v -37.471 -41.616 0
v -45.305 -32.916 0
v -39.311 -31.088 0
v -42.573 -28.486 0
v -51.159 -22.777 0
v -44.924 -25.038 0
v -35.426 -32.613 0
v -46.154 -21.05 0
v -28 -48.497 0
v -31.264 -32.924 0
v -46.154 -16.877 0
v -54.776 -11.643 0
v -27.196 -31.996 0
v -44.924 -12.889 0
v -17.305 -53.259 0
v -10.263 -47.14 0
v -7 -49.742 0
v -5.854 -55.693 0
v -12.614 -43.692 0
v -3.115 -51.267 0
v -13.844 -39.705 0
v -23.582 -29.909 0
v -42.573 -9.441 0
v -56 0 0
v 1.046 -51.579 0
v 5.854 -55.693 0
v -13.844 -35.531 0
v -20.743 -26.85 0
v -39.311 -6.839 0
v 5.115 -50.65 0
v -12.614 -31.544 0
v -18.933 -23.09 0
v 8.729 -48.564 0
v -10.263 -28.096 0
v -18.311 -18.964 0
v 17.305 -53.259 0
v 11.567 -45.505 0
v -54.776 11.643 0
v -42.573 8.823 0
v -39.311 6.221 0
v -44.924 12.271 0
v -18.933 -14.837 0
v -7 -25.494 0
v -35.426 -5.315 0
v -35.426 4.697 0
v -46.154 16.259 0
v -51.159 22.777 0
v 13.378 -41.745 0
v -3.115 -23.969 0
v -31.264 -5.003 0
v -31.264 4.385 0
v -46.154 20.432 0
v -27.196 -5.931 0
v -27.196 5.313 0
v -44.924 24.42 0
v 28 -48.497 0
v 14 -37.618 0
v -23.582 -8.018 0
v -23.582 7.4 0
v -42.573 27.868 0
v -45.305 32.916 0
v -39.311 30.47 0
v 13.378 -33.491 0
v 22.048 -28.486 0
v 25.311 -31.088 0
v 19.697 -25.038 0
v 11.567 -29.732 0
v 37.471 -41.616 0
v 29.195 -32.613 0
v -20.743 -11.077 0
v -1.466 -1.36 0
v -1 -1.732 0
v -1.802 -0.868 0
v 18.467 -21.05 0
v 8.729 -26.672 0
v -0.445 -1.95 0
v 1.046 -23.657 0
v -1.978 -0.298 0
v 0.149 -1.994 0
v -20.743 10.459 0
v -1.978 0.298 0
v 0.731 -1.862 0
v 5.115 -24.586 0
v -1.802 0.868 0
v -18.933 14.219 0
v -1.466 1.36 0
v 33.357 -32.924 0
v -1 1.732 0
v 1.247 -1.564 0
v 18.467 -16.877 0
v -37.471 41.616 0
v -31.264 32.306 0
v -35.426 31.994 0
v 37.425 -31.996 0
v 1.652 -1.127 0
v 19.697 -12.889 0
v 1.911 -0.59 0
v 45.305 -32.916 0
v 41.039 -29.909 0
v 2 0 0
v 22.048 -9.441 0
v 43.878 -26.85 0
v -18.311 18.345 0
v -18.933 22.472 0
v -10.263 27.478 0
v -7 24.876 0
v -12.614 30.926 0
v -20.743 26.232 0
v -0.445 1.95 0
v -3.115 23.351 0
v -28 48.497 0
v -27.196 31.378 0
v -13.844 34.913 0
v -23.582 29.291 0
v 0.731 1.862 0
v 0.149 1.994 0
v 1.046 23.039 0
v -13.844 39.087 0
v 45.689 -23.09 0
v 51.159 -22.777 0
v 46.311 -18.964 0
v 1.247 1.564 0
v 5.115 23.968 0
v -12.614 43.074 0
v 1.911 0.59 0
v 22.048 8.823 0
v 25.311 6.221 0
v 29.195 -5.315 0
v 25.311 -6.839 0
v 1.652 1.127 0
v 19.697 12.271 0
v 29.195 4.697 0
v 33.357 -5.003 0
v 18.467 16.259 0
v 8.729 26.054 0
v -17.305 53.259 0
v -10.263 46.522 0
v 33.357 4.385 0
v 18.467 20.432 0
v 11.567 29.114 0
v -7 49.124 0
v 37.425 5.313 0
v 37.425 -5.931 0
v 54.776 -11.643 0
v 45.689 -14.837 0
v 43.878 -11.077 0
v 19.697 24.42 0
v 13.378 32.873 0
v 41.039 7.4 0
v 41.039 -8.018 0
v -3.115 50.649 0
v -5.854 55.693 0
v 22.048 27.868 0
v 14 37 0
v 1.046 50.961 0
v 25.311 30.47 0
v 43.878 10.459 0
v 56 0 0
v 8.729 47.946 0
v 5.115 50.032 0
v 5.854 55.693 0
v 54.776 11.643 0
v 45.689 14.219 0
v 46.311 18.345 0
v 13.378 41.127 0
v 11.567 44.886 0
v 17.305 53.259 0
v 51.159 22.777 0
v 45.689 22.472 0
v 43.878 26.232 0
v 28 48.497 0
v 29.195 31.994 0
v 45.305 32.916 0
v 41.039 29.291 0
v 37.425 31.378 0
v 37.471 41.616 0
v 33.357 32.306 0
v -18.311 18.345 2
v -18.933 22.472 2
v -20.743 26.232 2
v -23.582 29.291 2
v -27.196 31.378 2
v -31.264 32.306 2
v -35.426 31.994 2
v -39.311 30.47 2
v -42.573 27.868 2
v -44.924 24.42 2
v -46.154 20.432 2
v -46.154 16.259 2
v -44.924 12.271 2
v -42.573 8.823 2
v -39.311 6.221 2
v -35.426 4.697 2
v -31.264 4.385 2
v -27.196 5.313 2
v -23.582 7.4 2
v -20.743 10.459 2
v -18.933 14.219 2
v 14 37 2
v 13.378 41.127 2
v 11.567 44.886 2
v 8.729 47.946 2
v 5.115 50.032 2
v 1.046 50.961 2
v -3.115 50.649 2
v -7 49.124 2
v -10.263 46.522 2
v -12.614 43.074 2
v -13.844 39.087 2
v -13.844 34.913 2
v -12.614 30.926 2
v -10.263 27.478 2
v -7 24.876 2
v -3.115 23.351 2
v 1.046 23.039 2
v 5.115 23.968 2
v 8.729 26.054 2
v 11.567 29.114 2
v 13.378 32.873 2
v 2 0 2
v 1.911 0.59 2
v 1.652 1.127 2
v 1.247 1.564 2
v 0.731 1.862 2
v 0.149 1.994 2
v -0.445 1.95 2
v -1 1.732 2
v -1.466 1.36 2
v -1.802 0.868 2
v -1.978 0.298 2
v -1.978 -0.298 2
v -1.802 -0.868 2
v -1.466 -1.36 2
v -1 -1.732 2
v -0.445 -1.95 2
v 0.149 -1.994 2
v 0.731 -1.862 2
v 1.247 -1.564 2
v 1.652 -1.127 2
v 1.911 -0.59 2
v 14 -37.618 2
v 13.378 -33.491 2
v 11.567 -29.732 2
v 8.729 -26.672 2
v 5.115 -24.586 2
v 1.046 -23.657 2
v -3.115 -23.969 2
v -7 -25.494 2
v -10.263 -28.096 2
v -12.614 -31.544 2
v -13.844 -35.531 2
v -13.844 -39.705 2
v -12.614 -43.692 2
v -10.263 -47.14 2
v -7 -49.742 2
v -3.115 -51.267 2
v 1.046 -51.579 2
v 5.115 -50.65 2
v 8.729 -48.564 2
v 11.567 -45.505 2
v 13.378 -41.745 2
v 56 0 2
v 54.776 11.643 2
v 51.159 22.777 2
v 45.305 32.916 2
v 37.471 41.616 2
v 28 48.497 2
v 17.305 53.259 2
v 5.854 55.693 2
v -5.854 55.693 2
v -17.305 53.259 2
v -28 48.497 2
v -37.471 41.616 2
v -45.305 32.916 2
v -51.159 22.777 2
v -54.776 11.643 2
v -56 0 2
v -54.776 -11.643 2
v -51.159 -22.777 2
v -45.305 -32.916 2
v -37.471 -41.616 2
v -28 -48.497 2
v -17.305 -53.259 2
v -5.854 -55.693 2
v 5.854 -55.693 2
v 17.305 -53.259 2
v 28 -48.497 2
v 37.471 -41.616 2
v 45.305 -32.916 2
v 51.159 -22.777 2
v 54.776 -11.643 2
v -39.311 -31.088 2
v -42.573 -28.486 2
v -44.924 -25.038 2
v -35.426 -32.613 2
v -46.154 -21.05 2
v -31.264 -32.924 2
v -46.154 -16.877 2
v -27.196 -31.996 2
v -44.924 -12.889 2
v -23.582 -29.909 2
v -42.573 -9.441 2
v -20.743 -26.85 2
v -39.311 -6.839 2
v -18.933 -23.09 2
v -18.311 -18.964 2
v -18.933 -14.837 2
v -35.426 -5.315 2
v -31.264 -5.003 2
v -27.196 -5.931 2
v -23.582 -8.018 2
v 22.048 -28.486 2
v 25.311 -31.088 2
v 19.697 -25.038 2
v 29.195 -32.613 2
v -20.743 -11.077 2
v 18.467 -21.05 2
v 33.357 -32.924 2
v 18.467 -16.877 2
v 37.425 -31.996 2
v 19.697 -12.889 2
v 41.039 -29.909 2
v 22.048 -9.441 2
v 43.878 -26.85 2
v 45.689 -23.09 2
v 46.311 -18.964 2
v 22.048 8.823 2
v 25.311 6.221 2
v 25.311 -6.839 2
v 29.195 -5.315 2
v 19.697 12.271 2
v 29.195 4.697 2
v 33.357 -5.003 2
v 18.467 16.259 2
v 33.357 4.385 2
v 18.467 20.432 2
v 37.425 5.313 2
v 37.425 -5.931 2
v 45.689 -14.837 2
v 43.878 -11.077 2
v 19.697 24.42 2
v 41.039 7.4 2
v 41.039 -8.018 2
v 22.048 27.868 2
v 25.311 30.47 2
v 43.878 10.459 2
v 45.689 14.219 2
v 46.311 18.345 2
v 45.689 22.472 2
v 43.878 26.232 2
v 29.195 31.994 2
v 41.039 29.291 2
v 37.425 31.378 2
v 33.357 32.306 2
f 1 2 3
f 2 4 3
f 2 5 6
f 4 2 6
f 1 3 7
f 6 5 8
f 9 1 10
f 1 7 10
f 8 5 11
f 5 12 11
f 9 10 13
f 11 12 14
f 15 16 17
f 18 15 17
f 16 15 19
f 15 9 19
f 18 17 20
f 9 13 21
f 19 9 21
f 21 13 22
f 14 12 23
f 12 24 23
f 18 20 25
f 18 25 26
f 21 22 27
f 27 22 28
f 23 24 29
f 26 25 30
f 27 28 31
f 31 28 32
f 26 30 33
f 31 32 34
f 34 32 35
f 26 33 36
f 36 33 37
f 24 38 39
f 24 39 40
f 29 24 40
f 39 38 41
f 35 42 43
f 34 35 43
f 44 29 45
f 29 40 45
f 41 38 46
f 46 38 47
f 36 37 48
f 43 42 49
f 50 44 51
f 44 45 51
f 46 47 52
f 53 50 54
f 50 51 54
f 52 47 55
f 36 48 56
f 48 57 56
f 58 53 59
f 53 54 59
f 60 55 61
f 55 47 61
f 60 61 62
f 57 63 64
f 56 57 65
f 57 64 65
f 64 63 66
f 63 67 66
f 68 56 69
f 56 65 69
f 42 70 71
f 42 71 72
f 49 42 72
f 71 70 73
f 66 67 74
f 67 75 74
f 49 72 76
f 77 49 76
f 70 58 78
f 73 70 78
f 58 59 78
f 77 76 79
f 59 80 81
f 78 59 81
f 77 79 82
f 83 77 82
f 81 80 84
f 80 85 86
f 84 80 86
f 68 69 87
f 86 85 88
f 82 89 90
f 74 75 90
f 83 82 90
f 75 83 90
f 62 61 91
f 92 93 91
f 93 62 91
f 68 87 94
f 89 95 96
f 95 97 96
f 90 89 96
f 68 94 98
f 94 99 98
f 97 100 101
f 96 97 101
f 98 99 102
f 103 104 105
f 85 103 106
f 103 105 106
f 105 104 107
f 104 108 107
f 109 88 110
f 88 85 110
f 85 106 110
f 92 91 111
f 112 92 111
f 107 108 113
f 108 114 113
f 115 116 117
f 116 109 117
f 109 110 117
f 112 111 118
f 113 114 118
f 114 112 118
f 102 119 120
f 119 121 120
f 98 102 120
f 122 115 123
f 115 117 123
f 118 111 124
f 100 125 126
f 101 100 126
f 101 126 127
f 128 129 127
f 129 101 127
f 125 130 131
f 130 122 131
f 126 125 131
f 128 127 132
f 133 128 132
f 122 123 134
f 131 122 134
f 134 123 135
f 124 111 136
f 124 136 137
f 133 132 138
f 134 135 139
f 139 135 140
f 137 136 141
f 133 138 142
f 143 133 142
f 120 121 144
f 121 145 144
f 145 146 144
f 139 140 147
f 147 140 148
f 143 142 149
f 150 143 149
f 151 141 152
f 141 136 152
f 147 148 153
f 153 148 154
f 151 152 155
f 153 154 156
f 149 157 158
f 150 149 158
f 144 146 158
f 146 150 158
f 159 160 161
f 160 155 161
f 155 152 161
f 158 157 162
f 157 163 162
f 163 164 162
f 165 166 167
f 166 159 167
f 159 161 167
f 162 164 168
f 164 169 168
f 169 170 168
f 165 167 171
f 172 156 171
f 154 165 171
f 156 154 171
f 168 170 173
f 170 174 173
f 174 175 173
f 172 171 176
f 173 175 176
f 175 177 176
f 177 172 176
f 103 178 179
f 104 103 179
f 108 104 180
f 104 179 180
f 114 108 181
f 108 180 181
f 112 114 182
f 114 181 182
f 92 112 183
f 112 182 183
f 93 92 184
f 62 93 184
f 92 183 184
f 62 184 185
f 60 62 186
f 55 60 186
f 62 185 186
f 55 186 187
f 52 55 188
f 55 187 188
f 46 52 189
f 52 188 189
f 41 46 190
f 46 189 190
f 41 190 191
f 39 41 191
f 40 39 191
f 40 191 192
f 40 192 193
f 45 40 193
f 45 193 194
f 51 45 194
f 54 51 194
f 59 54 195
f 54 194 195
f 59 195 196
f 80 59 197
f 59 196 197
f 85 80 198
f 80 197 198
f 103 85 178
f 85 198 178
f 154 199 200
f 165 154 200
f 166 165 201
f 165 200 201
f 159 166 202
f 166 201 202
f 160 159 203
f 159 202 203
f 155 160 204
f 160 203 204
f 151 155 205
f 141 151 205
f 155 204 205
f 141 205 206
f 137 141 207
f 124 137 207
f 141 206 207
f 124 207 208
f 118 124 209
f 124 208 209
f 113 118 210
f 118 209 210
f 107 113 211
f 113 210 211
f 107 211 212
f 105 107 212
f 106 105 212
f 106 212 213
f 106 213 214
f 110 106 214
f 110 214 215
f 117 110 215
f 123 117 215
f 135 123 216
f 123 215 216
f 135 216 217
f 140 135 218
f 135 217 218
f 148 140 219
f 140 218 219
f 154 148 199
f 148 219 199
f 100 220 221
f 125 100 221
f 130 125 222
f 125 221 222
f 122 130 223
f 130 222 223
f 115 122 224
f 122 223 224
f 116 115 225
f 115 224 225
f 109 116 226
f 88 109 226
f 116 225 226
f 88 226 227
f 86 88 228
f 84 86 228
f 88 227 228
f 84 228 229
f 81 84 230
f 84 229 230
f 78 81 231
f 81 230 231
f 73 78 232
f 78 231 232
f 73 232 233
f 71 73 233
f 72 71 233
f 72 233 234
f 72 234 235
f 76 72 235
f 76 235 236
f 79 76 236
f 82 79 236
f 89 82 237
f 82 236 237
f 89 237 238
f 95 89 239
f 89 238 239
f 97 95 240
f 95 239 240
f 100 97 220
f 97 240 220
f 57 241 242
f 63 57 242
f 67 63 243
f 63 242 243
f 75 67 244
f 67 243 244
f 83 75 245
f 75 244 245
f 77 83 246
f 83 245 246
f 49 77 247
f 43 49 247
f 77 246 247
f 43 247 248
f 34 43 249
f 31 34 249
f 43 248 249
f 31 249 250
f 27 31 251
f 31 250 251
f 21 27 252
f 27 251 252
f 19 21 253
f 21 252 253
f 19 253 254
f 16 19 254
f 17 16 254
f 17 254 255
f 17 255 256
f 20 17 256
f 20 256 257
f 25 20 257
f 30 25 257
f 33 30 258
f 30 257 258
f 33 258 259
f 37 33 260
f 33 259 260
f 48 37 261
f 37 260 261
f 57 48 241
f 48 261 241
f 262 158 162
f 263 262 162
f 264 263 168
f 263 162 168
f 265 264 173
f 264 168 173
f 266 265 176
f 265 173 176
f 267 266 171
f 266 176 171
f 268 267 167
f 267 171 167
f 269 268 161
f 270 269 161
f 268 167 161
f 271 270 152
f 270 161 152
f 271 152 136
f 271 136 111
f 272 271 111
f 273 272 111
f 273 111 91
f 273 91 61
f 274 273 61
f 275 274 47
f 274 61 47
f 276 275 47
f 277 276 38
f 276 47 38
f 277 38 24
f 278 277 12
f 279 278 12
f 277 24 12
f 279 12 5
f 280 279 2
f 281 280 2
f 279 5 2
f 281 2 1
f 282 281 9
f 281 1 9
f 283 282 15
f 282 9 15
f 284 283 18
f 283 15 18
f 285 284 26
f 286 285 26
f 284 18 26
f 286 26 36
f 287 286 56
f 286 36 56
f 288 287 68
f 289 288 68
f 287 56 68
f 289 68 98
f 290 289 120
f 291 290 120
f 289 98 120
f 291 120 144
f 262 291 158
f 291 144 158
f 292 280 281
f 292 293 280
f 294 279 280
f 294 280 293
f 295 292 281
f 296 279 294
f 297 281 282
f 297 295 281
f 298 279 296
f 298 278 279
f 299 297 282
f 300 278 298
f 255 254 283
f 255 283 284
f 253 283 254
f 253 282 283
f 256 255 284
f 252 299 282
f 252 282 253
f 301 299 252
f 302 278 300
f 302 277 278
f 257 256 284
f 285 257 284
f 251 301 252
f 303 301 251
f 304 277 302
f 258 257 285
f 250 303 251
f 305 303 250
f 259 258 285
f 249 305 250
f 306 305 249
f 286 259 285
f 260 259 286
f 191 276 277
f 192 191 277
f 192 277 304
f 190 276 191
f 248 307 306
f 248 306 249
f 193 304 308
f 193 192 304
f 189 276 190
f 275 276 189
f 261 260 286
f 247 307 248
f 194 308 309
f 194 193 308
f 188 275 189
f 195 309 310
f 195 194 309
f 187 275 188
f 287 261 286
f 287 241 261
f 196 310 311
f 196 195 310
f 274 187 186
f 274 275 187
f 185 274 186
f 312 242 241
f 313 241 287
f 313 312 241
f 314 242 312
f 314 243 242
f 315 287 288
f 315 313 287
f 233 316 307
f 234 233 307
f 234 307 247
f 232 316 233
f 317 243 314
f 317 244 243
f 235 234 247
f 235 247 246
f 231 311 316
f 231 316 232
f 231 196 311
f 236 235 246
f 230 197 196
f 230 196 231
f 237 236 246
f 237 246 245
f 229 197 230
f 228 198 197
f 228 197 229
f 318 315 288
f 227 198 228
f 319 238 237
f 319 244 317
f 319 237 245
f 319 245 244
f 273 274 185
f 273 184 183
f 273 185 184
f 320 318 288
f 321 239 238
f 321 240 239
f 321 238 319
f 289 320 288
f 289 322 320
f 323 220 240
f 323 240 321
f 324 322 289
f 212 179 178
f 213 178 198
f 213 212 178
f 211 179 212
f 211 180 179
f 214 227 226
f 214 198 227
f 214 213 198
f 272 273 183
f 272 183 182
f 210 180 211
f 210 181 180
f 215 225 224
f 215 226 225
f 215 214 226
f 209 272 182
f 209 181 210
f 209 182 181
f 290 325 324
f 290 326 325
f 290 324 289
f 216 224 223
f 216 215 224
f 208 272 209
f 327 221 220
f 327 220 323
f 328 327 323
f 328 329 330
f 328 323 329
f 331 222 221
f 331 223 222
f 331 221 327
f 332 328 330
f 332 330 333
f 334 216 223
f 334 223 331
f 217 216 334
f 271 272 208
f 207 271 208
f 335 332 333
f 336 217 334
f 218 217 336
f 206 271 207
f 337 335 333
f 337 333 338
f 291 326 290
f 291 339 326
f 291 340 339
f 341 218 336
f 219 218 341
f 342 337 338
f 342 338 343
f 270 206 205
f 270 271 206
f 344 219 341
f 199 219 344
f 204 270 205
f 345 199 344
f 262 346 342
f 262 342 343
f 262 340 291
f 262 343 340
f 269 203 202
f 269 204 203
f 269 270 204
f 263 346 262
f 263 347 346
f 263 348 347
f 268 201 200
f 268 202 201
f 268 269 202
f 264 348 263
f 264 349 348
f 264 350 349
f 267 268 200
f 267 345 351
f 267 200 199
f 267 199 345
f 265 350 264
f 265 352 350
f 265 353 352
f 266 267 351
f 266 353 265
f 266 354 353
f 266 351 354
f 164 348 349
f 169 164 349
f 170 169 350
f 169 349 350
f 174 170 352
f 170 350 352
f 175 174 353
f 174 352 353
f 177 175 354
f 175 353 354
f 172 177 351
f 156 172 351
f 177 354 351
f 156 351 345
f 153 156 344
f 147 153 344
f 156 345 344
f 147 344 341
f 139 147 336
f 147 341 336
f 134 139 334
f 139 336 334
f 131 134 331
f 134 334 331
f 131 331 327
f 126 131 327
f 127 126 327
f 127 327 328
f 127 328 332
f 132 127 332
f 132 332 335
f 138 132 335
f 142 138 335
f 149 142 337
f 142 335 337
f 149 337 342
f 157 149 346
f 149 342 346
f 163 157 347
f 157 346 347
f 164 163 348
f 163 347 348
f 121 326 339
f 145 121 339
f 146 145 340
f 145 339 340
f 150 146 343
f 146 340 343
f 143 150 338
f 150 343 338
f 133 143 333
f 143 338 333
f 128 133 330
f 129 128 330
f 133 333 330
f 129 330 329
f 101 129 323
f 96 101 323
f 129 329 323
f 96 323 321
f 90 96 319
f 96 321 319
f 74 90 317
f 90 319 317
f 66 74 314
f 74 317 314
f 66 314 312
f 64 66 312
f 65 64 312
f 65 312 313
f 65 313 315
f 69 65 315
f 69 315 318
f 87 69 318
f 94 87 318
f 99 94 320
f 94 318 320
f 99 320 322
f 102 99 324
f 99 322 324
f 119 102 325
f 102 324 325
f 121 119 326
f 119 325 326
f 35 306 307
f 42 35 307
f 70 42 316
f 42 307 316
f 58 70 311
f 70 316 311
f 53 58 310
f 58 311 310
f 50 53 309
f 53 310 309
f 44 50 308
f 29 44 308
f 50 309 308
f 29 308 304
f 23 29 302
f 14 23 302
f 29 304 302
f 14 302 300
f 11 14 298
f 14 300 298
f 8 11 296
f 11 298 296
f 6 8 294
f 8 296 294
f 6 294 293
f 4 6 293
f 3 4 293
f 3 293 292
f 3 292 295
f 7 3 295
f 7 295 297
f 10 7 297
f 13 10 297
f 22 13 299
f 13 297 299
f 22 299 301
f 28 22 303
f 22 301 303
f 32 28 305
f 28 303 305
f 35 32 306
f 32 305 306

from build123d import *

# Parameters (mm, degrees)
F0_R     = 56
F1_DEPTH = 2
F2_R     = 2
F3_DEPTH = 2
F4_R     = 14
F5_DEPTH = 2


with BuildPart() as f1:
    # F0 (on Top) → F1 (new body)
    with BuildSketch(Plane.XY):
        Circle(F0_R)
    extrude(amount=F1_DEPTH)

    # F2 (on face) → F3 (cut)
    with BuildSketch(Plane.XY.offset(2)):
        Circle(F2_R)
    extrude(amount=-F3_DEPTH, mode=Mode.SUBTRACT)

    # F4 (on face) → F5 (cut)
    with BuildSketch(Plane.XY.offset(2)):
        with Locations((0, 37)):
            Circle(F4_R)
        with Locations((-32.310554, 18.345493)):
            Circle(F4_R)
        with Locations((-32.310554, -18.963521)):
            Circle(F4_R)
        with Locations((0, -37.618028)):
            Circle(F4_R)
        with Locations((32.310554, -18.963521)):
            Circle(F4_R)
        with Locations((32.310554, 18.345493)):
            Circle(F4_R)
    extrude(amount=-F5_DEPTH, mode=Mode.SUBTRACT)


solid = f1.part
